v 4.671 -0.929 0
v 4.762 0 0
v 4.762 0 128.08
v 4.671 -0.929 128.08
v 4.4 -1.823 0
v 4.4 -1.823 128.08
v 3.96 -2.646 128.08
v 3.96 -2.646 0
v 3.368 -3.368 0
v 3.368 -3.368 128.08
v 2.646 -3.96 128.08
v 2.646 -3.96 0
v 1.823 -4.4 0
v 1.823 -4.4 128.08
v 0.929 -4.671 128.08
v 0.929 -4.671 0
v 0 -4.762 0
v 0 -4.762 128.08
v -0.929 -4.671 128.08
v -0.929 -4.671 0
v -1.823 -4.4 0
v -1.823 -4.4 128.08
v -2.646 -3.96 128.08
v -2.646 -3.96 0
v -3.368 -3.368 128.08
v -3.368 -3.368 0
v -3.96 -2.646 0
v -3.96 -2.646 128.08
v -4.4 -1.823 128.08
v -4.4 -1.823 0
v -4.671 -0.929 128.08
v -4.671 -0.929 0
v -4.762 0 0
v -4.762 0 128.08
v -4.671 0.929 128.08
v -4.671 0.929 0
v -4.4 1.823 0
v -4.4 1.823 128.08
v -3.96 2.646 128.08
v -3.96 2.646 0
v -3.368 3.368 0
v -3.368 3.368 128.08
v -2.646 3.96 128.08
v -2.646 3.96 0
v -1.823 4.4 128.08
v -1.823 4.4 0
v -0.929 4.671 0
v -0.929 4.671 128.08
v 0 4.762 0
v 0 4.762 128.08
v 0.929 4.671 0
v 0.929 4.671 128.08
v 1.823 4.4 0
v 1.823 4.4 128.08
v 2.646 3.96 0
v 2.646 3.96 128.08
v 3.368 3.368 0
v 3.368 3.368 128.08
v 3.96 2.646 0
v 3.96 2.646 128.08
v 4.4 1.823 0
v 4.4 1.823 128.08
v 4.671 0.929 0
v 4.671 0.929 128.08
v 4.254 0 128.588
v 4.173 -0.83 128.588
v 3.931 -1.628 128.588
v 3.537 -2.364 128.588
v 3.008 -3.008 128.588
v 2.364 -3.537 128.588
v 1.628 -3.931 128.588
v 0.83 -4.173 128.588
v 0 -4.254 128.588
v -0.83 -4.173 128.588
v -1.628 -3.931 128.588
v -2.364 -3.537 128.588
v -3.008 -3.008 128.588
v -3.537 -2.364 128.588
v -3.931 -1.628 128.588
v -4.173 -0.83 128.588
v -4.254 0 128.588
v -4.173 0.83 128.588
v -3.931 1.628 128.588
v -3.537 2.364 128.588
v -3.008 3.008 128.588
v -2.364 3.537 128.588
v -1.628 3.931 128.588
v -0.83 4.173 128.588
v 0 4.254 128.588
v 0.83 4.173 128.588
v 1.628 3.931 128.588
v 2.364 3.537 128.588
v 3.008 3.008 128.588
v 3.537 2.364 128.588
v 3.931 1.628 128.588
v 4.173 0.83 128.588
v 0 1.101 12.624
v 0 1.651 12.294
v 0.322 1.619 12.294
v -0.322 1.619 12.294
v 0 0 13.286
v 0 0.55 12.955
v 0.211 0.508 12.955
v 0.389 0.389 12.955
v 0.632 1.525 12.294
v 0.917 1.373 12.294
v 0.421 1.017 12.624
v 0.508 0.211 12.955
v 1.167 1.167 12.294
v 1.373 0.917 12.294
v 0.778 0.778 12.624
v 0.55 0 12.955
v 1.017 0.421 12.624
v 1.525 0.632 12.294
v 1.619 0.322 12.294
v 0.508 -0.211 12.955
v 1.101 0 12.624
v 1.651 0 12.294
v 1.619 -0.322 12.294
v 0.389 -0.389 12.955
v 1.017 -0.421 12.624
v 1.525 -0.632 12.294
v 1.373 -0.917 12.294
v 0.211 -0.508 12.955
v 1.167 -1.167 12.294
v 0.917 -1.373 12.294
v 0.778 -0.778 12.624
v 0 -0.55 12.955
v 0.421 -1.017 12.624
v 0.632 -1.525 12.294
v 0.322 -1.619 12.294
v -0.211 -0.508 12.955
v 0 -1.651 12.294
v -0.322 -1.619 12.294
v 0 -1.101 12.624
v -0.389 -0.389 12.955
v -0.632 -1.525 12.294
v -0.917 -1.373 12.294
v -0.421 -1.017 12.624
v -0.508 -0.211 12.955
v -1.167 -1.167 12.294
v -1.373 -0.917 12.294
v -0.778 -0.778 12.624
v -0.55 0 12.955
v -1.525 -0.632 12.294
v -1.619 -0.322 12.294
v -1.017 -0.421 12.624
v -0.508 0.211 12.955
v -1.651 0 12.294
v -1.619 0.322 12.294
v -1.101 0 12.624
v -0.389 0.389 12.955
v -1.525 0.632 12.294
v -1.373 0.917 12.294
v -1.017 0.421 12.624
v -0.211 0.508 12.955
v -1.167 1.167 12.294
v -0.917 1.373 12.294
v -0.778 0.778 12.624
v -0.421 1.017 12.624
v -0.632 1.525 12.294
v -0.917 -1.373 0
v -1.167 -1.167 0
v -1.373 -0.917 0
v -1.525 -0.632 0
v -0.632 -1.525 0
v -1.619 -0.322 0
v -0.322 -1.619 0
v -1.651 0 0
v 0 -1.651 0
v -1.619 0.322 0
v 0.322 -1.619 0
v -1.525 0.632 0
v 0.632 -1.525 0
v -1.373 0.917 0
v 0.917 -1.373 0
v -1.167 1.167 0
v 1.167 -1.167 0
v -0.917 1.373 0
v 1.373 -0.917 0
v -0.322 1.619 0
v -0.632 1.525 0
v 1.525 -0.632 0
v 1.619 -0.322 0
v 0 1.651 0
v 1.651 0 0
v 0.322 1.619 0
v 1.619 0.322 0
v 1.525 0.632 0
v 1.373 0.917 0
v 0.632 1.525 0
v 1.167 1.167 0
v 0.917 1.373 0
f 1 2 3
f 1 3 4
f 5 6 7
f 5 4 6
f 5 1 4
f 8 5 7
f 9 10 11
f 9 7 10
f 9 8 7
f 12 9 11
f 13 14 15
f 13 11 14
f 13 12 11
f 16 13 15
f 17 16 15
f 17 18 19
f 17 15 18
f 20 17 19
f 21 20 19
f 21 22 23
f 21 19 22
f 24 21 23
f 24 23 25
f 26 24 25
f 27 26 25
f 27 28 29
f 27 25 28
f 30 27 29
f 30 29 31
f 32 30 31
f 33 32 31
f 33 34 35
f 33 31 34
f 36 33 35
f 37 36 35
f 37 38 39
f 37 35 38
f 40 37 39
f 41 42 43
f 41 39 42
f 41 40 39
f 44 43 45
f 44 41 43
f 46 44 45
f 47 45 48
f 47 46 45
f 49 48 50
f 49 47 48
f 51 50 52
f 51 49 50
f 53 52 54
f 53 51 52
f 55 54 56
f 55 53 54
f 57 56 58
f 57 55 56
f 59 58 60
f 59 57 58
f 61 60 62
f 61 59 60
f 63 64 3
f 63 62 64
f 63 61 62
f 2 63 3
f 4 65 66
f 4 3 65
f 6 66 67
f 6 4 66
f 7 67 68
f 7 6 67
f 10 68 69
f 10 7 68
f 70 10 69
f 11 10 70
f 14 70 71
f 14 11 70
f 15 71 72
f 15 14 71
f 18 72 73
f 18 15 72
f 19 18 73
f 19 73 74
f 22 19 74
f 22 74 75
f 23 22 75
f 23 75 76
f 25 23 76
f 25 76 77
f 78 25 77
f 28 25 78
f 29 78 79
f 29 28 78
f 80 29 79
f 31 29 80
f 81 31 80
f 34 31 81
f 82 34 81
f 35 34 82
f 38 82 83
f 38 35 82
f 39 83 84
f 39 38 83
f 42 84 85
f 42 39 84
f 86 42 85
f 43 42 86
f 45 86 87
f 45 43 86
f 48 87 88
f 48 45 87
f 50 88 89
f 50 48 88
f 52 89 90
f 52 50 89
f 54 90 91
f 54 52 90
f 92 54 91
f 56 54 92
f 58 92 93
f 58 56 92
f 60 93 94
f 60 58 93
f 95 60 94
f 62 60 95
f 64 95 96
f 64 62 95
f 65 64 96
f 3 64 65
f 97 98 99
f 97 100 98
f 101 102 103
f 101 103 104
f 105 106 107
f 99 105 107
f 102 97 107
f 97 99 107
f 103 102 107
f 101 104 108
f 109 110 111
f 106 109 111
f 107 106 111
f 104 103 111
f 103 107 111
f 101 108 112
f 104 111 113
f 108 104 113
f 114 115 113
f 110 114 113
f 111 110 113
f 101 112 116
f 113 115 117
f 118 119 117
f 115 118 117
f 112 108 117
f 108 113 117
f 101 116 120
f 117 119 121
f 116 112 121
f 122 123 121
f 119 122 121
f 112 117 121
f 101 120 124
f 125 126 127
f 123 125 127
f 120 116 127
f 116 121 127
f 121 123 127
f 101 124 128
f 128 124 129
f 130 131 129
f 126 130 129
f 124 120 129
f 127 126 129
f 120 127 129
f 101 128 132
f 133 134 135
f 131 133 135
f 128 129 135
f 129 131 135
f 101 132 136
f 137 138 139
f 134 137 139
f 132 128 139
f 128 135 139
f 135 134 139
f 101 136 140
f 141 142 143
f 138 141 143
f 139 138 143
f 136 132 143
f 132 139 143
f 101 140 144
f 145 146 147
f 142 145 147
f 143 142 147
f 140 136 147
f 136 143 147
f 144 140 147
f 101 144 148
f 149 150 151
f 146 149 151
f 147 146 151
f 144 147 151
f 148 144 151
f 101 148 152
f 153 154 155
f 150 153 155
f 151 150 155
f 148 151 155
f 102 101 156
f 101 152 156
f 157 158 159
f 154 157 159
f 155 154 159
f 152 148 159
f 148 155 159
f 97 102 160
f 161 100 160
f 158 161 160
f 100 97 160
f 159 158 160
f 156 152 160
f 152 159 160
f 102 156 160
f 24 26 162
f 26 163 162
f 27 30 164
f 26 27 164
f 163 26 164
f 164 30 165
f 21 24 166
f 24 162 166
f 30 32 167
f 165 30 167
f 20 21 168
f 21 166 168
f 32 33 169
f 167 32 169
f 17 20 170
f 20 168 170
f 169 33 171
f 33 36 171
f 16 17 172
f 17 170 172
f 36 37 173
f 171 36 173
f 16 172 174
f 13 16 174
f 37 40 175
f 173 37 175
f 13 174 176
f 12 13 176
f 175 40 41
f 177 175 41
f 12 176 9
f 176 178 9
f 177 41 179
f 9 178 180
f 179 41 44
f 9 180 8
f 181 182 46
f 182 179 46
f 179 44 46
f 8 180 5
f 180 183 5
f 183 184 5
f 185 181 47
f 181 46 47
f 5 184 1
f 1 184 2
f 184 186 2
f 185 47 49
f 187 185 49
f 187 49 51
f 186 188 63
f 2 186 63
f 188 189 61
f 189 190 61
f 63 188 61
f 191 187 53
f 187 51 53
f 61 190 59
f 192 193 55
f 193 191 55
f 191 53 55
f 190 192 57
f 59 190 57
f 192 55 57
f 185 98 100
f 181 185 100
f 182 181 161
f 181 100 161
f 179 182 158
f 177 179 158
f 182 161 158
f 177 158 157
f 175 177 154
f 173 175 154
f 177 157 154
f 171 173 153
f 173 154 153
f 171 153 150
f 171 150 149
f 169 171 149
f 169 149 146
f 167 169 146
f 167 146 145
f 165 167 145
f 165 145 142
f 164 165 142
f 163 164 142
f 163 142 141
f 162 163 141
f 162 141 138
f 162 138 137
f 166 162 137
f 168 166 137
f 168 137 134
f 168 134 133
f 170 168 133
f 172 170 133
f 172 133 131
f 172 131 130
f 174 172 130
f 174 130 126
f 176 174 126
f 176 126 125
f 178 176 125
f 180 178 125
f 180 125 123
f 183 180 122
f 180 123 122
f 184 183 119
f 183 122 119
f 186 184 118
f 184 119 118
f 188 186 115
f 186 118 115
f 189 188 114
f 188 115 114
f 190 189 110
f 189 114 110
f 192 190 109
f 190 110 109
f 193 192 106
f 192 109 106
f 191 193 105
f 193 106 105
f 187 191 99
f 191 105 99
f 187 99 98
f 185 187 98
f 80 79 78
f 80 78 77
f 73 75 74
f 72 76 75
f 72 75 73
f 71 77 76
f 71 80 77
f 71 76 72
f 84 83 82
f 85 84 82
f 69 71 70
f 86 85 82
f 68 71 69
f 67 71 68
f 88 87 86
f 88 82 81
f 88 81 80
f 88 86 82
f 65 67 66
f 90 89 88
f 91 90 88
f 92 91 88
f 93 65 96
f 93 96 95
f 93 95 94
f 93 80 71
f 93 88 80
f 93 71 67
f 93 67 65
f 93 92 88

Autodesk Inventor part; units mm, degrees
ref_plane "YZ Plane" through (0, 0, 0) normal (1, 0, 0) x (0, 1, 0)
ref_plane "XZ Plane" through (0, 0, 0) normal (0, 1, 0) x (-1, 0, 0)
ref_plane "XY Plane" through (0, 0, 0) normal (0, 0, 1) x (1, 0, 0)
sketch "Sketch1" plane through (0, 0, 0) normal (0, 0, 1) x (1, 0, 0)
  circle A0 centre (0, 0) radius 4.7625
  dimension "d0" = 9.525
extrude "Extrusion1" add sketch "Sketch1" along normal blind 128.5875
sketch "Sketch2" plane through (0, 0, 0) normal (0, 0, -1) x (-1, 0, 0)
  point P0 (0, 0)
  point P1 (0, 0)
hole "Hole1" at (0, 0, 0) direction (0, 0, 1) diameter 3.302 depth 12.2936 tip angle 118 thread size "8-32 UNC" class "2B" standard "ANSI Unified Screw Threads"
chamfer "Chamfer1" distance 0.508 angle 45 1 edges at (-4.7625, 0, 128.5875)
properties part number "post"
